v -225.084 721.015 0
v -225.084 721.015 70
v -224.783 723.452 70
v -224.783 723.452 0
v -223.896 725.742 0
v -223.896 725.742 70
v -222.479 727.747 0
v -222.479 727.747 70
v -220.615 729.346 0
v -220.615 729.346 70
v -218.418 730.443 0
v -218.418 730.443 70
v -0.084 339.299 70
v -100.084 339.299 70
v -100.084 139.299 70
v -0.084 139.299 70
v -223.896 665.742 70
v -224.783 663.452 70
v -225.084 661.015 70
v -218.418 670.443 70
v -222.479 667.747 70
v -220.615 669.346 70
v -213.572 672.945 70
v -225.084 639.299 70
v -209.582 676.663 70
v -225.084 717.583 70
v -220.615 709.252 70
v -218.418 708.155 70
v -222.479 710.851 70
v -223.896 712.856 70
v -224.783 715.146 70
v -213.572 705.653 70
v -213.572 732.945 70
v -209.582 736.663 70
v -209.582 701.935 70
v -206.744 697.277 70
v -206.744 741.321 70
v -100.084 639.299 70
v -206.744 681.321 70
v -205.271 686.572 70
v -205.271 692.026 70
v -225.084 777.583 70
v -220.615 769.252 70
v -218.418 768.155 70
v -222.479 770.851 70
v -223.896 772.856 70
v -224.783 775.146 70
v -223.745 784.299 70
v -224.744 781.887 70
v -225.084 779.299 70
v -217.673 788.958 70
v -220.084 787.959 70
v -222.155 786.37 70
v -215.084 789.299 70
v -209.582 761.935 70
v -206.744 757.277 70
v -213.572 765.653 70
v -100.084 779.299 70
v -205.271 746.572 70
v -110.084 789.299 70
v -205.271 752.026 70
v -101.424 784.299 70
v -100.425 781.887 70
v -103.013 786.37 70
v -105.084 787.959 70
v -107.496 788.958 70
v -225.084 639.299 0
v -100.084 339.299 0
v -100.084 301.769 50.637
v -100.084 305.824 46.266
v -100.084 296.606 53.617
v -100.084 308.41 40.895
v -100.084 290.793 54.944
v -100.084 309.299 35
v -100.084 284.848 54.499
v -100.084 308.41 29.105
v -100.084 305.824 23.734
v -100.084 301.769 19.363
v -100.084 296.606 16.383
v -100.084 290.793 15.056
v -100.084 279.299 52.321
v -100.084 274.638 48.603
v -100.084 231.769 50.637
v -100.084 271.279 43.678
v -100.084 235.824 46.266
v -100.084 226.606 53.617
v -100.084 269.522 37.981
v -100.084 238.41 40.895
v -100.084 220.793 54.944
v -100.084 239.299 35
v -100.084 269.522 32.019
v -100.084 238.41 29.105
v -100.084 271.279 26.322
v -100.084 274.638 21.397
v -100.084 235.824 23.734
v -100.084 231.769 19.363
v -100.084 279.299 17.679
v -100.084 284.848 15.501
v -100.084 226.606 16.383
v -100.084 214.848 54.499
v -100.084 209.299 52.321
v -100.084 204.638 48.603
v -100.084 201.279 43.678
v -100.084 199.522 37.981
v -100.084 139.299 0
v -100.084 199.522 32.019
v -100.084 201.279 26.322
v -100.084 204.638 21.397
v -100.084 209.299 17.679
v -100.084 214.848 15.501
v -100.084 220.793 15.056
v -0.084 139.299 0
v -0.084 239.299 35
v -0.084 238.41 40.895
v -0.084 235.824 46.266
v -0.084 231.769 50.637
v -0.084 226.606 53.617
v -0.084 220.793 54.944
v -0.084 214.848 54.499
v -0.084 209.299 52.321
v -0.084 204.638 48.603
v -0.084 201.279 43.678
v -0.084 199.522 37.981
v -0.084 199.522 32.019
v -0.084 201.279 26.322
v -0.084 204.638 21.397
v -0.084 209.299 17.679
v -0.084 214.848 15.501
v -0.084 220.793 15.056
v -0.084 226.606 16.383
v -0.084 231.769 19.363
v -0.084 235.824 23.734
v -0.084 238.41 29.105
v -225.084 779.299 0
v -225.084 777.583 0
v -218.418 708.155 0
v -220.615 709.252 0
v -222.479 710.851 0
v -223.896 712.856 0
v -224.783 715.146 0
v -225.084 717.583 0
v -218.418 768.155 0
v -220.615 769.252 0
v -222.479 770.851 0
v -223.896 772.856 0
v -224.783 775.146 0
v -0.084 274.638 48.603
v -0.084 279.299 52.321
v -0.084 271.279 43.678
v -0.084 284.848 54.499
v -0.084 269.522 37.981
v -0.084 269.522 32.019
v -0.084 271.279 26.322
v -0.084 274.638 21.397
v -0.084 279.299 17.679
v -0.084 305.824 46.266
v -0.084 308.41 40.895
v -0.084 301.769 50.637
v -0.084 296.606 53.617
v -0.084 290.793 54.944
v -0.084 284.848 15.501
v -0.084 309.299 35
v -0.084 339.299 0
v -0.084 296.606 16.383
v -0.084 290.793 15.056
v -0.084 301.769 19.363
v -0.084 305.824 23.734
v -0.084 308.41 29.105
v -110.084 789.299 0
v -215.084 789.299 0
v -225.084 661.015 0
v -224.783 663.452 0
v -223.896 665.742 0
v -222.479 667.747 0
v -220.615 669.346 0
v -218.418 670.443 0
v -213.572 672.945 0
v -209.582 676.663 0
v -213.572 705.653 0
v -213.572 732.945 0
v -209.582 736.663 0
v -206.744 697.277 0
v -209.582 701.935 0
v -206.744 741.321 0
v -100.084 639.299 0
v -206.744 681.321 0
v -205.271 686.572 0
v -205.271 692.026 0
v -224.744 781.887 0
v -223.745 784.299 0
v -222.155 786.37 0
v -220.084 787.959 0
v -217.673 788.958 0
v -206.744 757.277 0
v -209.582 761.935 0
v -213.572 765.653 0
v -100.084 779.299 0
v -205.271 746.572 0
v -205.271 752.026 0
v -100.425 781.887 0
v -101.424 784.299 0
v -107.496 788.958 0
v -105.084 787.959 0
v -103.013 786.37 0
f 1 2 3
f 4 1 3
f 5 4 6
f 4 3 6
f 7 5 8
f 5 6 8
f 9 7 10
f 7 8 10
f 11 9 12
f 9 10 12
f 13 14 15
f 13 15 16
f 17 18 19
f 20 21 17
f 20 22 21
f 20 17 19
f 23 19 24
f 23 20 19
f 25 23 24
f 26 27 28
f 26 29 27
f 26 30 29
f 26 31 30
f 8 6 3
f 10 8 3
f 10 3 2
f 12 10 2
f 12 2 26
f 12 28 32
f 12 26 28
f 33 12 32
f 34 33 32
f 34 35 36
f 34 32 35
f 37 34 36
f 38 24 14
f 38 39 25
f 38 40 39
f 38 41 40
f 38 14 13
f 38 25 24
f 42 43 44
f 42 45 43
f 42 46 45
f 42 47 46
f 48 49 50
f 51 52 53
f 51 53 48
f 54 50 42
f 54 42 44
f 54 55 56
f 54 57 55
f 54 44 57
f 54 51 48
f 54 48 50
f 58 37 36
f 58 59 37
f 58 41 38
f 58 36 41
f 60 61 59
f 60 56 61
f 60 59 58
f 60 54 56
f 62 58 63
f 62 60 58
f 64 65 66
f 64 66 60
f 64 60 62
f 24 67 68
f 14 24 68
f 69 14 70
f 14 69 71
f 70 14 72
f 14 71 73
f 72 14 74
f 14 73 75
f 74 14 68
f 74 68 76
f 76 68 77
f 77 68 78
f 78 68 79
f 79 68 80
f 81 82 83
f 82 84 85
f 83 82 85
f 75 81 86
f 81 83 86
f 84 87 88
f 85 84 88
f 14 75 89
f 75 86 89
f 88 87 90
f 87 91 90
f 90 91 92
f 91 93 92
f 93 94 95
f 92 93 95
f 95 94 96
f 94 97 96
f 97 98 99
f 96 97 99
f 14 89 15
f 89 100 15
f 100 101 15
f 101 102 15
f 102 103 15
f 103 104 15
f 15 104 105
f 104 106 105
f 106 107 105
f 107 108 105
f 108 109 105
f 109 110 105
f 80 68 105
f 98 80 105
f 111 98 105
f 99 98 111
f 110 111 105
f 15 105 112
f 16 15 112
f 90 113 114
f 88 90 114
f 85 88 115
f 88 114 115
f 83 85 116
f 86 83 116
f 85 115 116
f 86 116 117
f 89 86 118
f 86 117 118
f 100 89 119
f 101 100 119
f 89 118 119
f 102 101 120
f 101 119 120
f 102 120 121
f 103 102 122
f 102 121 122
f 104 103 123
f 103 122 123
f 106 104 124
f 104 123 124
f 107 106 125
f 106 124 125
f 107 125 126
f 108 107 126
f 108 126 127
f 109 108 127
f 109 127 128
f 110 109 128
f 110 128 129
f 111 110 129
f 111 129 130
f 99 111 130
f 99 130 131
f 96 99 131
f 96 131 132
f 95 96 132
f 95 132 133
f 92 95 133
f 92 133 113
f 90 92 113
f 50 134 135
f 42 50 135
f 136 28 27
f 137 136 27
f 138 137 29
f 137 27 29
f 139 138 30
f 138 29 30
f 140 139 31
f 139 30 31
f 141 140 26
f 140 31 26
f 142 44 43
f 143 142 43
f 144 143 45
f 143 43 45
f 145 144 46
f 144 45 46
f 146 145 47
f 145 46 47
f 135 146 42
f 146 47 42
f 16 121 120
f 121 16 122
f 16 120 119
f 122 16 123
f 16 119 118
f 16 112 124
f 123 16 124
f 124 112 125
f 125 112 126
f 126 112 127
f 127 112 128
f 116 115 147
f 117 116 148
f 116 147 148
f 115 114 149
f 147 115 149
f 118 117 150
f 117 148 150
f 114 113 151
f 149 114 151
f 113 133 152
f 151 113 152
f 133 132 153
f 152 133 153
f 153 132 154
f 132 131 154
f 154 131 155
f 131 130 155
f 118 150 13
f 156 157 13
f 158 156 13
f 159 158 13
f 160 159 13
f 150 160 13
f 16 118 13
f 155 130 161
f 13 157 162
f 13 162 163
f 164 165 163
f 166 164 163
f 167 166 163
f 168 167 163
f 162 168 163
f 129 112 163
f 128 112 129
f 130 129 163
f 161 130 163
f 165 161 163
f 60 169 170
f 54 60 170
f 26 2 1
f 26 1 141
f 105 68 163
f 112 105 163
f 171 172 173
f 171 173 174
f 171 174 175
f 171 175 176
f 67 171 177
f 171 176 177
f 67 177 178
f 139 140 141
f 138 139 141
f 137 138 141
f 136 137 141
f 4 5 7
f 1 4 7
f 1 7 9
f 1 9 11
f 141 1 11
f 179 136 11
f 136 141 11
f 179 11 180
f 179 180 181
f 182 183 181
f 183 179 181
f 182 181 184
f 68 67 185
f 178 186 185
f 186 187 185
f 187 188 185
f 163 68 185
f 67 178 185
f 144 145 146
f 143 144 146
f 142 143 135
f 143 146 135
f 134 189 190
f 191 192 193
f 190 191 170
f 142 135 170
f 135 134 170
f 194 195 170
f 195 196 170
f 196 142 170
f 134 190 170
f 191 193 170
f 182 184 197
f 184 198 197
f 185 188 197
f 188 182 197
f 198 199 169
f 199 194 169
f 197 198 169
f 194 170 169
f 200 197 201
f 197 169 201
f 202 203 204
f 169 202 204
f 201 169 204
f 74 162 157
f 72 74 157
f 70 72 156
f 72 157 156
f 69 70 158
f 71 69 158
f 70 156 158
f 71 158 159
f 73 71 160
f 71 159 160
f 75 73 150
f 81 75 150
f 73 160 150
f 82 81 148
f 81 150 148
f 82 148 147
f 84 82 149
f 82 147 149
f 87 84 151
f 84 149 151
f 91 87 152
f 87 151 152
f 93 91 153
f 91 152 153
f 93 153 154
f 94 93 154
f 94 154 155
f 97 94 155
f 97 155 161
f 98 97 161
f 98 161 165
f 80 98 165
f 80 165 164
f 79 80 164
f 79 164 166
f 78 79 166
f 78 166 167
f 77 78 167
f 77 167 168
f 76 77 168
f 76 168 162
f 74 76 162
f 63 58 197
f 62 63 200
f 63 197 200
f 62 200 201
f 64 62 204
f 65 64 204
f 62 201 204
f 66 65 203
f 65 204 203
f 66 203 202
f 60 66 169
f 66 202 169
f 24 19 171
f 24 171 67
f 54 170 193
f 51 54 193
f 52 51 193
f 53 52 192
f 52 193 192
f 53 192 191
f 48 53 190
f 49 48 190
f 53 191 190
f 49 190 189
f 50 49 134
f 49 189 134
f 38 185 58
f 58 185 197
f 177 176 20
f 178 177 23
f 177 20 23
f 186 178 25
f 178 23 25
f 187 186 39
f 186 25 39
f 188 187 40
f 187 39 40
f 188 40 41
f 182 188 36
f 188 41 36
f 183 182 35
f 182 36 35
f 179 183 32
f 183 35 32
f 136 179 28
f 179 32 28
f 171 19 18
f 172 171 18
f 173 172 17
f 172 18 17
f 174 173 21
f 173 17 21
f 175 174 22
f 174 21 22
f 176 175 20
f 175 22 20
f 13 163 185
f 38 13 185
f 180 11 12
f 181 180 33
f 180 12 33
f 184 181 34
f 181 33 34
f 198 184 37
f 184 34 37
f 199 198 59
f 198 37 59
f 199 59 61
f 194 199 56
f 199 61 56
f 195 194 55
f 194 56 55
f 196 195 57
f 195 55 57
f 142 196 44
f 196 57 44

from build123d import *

# Parameters (mm, degrees)
BOSS_EXTRUDE1_DEPTH = 70
SKETCH2_R           = 20
CUT_EXTRUDE1_DEPTH  = 192
CUT_EXTRUDE2_DEPTH  = 192
CUT_EXTRUDE3_DEPTH  = 192


with BuildPart() as part:
    # Sketch1 → Boss-Extrude1 (new body)
    with BuildSketch(Plane.XY):
        with BuildLine():
            Line((-100.084321869, 339.298857864), (-100.084321869, 139.298857864))
            Line((-100.084321869, 139.298857864), (-0.084321869, 139.298857864))
            Line((-0.084321869, 139.298857864), (-0.084321869, 339.298857864))
            Line((-0.084321869, 339.298857864), (-100.084321869, 639.298857864))
            Line((-100.084321869, 639.298857864), (-100.084321869, 779.298857864))
            ThreePointArc((-100.084321869, 779.298857864), (-103.013254057, 786.369925676), (-110.084321869, 789.298857864))
            Line((-110.084321869, 789.298857864), (-215.084321869, 789.298857864))
            ThreePointArc((-215.084321869, 789.298857864), (-222.155389681, 786.369925676), (-225.084321869, 779.298857864))
            Line((-225.084321869, 779.298857864), (-225.084321869, 639.298857864))
            Line((-225.084321869, 639.298857864), (-100.084321869, 339.298857864))
        make_face()
    extrude(amount=BOSS_EXTRUDE1_DEPTH)

    # Sketch2 → Cut-Extrude1 (cut)
    with BuildSketch(Plane(origin=(-0.084321869, 0, 0), x_dir=(0, 0, -1), z_dir=(1, 0, 0))):
        with Locations(Location((-35, 289.298857864, 0), (0, 0, 90))):
            Circle(SKETCH2_R)
        with Locations(Location((-35, 219.298857864, 0), (0, 0, 90))):
            Circle(SKETCH2_R)
    extrude(amount=-CUT_EXTRUDE1_DEPTH, mode=Mode.SUBTRACT)

    # Sketch3 → Cut-Extrude2 (cut)
    with BuildSketch(Plane.XY.offset(70)):
        with BuildLine():
            Line((-225.084321869, 769.298857864), (-225.084321869, 749.298857864))
            Line((-225.084321869, 749.298857864), (-225.084321869, 729.298857864))
            ThreePointArc((-225.084321869, 729.298857864), (-205.084321869, 749.298857864), (-225.084321869, 769.298857864))
        make_face()
        with BuildLine():
            Line((-225.084321869, 689.298857864), (-225.084321869, 669.298857864))
            ThreePointArc((-225.084321869, 669.298857864), (-205.084321869, 689.298857864), (-225.084321869, 709.298857864))
            Line((-225.084321869, 709.298857864), (-225.084321869, 689.298857864))
        make_face()
    extrude(amount=-CUT_EXTRUDE2_DEPTH, mode=Mode.SUBTRACT)

    # Sketch4 → Cut-Extrude3 (cut)
    with BuildSketch(Plane.XY.offset(70)):
        with BuildLine():
            Line((-218.417655203, 730.442677032), (-225.084321869, 729.298857864))
            Line((-225.084321869, 729.298857864), (-225.084321869, 721.014586617))
            ThreePointArc((-225.084321869, 721.014586617), (-223.249287678, 726.788089308), (-218.417655203, 730.442677032))
        make_face()
        with BuildLine():
            Line((-225.084321869, 717.583129111), (-225.084321869, 709.298857864))
            Line((-225.084321869, 709.298857864), (-218.417655203, 708.155038696))
            ThreePointArc((-218.417655203, 708.155038696), (-223.249287678, 711.80962642), (-225.084321869, 717.583129111))
        make_face()
        with BuildLine():
            Line((-218.417655203, 670.442677032), (-225.084321869, 669.298857864))
            Line((-225.084321869, 669.298857864), (-225.084321869, 661.014586617))
            ThreePointArc((-225.084321869, 661.014586617), (-223.249287678, 666.788089308), (-218.417655203, 670.442677032))
        make_face()
        with BuildLine():
            Line((-225.084321869, 777.583129111), (-225.084321869, 769.298857864))
            Line((-225.084321869, 769.298857864), (-218.417655203, 768.155038696))
            ThreePointArc((-218.417655203, 768.155038696), (-223.249287678, 771.80962642), (-225.084321869, 777.583129111))
        make_face()
    extrude(amount=-CUT_EXTRUDE3_DEPTH, mode=Mode.SUBTRACT)


solid = part.part
